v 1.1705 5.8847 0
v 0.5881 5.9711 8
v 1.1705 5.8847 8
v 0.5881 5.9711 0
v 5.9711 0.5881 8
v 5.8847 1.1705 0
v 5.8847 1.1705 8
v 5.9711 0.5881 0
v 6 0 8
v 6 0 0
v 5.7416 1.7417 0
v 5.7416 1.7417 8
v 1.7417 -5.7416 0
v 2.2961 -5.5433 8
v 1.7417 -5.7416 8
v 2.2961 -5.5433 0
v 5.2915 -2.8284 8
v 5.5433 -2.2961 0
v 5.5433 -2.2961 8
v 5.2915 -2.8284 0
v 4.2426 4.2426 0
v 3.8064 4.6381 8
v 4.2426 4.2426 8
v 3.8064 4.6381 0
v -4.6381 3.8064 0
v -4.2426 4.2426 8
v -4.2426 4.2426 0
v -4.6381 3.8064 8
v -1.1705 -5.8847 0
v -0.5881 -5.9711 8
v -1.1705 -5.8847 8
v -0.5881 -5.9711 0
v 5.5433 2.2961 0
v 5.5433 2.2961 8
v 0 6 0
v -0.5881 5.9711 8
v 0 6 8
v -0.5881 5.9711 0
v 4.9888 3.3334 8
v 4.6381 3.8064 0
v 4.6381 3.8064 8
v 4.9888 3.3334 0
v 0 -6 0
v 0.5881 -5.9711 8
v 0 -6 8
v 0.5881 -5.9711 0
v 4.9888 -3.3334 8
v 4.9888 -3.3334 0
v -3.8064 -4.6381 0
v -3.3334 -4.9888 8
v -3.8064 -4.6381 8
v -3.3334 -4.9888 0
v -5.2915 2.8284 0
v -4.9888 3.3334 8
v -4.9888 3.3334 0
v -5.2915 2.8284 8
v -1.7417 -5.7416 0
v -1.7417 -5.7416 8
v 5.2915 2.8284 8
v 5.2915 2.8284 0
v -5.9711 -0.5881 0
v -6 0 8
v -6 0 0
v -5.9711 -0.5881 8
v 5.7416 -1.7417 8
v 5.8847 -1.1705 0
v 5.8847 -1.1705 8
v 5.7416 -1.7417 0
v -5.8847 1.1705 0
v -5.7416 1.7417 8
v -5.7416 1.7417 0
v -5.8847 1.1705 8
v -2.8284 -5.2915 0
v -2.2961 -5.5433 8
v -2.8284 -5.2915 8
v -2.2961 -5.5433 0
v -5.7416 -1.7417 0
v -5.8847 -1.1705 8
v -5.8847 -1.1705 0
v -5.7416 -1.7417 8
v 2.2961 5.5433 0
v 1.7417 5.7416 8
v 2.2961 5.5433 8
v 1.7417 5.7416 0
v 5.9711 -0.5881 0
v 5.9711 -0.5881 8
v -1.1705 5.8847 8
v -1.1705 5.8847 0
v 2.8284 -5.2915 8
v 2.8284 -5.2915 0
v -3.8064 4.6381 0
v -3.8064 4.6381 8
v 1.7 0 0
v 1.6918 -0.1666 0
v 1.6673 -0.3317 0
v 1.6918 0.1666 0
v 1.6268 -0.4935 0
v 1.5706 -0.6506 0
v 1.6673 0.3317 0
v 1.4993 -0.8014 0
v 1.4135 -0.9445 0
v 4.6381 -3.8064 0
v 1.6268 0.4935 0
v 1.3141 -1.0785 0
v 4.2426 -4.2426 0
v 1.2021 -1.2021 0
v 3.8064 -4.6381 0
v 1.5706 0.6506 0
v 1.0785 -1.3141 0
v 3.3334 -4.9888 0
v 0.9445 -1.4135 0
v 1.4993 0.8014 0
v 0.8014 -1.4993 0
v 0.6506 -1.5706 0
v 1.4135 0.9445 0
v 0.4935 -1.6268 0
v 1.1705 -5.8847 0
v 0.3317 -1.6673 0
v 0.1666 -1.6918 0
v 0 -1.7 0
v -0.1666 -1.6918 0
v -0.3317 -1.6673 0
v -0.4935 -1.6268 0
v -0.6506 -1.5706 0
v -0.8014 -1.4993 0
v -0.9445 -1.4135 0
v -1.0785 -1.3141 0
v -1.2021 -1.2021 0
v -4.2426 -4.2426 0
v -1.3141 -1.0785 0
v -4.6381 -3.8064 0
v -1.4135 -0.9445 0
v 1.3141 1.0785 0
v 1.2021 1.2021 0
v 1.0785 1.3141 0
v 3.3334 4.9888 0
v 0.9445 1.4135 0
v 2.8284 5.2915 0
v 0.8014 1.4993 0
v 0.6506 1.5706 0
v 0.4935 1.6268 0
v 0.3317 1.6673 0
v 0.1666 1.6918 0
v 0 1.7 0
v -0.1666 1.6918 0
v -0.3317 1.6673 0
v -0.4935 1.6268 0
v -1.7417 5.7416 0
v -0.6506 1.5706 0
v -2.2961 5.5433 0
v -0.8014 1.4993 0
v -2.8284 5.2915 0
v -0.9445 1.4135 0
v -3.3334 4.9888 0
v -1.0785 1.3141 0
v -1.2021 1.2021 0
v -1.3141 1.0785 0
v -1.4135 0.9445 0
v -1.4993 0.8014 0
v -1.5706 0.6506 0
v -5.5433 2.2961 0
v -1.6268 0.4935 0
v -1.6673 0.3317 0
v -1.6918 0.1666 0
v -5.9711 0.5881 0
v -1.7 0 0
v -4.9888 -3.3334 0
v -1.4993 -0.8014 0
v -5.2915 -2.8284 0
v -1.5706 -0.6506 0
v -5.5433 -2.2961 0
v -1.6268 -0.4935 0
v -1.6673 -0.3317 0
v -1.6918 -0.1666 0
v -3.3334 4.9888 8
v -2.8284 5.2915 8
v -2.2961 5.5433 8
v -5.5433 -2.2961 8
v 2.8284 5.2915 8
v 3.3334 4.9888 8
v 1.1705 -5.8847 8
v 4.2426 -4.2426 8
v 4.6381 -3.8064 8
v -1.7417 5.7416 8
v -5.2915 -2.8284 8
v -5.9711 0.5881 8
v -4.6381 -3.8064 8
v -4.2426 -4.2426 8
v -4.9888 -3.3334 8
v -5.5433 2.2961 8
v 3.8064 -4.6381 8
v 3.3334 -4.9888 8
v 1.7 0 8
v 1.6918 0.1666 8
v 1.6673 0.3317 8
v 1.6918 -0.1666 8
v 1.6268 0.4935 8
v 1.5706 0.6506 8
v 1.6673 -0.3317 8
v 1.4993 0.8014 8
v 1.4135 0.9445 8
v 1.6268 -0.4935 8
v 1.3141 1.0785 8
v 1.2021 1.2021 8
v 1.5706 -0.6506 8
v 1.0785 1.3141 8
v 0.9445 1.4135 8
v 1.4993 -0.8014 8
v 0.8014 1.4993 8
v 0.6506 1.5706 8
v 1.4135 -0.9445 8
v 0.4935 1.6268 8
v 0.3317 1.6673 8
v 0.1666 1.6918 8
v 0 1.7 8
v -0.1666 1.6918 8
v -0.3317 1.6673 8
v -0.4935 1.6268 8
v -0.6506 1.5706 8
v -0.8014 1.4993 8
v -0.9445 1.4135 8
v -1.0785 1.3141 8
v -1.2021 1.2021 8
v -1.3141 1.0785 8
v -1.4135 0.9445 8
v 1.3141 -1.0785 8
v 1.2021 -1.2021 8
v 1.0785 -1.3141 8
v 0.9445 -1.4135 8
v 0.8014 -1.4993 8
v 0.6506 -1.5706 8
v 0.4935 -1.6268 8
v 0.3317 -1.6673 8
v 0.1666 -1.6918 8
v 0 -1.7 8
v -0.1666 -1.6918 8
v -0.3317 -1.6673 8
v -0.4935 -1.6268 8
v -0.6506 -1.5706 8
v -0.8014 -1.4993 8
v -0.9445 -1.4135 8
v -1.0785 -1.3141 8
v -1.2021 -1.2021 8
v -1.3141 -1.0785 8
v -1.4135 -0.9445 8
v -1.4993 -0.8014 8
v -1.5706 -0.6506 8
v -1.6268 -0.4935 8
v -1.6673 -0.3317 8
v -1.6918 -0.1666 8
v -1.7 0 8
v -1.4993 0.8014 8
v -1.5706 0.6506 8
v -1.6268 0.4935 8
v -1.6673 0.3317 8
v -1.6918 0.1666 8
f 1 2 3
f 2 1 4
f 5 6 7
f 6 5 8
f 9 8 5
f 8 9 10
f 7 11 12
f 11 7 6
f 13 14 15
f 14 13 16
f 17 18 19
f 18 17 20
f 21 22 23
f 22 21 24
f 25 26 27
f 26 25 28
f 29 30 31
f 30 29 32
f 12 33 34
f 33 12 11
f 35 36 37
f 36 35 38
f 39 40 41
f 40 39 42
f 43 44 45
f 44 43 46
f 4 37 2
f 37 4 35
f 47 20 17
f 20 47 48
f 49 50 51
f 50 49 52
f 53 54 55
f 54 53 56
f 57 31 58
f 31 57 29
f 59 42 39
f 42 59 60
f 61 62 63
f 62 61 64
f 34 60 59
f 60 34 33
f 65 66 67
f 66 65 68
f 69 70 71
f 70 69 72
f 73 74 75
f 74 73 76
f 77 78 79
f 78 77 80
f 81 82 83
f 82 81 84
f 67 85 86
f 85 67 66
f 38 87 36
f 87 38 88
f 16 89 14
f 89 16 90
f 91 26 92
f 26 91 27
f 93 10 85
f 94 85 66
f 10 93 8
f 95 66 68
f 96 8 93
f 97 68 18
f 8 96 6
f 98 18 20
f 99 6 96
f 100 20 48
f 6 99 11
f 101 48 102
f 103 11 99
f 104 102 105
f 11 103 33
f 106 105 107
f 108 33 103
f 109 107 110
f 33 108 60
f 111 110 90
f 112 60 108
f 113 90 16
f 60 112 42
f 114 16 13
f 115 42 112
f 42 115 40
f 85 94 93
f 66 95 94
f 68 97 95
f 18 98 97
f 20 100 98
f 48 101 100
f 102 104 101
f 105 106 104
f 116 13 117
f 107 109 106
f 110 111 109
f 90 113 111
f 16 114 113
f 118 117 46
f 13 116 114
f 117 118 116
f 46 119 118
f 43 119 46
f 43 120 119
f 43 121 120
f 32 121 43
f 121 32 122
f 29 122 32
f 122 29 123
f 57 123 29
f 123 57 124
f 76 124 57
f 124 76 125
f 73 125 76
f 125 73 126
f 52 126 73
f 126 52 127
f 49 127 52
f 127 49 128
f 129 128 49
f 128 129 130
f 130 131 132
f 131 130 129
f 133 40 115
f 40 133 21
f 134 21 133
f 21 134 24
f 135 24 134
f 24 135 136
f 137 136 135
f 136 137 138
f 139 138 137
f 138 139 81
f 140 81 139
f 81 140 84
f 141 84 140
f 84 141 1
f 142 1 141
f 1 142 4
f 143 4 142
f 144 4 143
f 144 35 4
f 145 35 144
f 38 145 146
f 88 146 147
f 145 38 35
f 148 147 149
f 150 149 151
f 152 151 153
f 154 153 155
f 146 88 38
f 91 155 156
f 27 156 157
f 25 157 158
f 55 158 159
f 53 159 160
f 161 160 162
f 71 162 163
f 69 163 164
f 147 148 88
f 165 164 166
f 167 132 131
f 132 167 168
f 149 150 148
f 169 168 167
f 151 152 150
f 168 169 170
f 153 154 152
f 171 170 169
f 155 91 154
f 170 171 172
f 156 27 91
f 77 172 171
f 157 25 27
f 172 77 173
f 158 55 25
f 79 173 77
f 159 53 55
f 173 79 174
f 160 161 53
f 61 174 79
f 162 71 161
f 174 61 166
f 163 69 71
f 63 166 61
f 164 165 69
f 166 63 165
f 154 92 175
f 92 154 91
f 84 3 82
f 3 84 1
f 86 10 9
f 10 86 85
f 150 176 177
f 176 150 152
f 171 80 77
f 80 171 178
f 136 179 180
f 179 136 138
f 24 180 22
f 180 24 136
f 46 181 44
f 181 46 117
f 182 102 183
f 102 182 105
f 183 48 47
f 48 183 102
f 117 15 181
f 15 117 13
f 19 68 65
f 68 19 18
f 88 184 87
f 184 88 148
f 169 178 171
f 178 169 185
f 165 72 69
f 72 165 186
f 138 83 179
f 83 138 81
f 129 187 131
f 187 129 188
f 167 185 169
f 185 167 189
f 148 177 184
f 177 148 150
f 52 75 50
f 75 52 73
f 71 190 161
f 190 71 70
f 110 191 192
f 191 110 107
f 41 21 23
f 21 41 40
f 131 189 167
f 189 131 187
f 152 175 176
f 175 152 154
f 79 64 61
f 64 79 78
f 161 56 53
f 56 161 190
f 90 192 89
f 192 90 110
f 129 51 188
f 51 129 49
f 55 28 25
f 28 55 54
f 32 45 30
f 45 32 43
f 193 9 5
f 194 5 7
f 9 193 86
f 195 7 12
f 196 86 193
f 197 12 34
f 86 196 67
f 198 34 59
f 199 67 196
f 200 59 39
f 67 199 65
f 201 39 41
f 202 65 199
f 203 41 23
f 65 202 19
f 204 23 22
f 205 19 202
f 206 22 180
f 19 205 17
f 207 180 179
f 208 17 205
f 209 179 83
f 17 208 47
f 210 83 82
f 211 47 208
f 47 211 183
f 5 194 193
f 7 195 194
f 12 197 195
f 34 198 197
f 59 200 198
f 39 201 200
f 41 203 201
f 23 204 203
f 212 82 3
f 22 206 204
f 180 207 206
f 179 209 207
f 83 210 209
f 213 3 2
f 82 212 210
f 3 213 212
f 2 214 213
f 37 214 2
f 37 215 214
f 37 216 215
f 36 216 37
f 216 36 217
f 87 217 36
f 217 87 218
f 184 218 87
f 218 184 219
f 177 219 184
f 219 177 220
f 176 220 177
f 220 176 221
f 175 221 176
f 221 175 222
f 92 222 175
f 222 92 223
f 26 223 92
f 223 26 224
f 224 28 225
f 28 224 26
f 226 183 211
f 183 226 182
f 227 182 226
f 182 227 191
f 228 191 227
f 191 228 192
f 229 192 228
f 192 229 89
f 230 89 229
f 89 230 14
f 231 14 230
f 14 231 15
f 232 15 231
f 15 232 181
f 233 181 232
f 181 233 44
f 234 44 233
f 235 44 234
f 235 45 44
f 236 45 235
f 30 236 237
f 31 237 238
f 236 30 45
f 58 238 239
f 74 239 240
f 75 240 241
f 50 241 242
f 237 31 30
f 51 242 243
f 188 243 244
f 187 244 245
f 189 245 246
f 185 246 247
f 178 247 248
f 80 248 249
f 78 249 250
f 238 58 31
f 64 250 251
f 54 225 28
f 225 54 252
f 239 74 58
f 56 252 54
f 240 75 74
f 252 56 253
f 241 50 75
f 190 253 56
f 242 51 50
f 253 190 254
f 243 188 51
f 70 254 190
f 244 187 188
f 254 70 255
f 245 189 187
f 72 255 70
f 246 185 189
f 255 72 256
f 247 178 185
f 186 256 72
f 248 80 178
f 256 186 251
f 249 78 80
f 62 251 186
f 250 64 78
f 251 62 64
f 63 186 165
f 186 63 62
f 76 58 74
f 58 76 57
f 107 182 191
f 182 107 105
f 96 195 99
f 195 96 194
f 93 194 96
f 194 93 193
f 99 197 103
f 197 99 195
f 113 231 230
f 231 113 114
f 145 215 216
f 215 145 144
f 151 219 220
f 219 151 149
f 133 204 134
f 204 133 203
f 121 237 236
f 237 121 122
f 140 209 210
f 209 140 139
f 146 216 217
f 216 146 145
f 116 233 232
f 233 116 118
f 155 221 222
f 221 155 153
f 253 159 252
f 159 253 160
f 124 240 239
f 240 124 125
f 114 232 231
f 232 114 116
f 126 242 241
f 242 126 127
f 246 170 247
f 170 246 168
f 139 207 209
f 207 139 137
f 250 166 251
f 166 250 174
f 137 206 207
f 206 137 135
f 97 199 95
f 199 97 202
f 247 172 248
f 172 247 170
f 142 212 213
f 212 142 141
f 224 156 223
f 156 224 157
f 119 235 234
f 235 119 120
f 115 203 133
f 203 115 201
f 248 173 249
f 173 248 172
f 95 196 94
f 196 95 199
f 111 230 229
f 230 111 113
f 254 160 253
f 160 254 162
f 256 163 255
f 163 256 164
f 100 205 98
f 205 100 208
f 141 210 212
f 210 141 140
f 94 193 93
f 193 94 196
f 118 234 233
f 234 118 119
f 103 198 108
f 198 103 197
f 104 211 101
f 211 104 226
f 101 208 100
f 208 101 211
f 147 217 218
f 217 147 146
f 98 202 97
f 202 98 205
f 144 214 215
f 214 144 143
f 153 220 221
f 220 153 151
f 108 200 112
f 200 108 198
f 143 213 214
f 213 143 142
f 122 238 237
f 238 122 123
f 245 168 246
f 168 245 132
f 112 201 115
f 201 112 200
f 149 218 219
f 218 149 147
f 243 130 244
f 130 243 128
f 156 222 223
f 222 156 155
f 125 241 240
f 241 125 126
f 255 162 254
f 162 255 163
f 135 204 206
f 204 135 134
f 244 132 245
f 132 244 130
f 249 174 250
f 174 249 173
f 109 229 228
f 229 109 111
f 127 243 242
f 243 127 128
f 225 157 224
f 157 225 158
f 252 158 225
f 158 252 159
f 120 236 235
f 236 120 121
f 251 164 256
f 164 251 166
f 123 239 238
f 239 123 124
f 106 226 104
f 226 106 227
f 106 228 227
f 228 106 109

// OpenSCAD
// Generated by printspec 0.1.0
// Review generated CAD before manufacturing.

outer_diameter = 12;
height = 8;
inner_diameter = 3.4;

difference() {
  cylinder(h = height, d = outer_diameter, $fn = 64);
  translate([0, 0, -0.1]) cylinder(h = height + 0.2, d = inner_diameter, $fn = 64);
}
